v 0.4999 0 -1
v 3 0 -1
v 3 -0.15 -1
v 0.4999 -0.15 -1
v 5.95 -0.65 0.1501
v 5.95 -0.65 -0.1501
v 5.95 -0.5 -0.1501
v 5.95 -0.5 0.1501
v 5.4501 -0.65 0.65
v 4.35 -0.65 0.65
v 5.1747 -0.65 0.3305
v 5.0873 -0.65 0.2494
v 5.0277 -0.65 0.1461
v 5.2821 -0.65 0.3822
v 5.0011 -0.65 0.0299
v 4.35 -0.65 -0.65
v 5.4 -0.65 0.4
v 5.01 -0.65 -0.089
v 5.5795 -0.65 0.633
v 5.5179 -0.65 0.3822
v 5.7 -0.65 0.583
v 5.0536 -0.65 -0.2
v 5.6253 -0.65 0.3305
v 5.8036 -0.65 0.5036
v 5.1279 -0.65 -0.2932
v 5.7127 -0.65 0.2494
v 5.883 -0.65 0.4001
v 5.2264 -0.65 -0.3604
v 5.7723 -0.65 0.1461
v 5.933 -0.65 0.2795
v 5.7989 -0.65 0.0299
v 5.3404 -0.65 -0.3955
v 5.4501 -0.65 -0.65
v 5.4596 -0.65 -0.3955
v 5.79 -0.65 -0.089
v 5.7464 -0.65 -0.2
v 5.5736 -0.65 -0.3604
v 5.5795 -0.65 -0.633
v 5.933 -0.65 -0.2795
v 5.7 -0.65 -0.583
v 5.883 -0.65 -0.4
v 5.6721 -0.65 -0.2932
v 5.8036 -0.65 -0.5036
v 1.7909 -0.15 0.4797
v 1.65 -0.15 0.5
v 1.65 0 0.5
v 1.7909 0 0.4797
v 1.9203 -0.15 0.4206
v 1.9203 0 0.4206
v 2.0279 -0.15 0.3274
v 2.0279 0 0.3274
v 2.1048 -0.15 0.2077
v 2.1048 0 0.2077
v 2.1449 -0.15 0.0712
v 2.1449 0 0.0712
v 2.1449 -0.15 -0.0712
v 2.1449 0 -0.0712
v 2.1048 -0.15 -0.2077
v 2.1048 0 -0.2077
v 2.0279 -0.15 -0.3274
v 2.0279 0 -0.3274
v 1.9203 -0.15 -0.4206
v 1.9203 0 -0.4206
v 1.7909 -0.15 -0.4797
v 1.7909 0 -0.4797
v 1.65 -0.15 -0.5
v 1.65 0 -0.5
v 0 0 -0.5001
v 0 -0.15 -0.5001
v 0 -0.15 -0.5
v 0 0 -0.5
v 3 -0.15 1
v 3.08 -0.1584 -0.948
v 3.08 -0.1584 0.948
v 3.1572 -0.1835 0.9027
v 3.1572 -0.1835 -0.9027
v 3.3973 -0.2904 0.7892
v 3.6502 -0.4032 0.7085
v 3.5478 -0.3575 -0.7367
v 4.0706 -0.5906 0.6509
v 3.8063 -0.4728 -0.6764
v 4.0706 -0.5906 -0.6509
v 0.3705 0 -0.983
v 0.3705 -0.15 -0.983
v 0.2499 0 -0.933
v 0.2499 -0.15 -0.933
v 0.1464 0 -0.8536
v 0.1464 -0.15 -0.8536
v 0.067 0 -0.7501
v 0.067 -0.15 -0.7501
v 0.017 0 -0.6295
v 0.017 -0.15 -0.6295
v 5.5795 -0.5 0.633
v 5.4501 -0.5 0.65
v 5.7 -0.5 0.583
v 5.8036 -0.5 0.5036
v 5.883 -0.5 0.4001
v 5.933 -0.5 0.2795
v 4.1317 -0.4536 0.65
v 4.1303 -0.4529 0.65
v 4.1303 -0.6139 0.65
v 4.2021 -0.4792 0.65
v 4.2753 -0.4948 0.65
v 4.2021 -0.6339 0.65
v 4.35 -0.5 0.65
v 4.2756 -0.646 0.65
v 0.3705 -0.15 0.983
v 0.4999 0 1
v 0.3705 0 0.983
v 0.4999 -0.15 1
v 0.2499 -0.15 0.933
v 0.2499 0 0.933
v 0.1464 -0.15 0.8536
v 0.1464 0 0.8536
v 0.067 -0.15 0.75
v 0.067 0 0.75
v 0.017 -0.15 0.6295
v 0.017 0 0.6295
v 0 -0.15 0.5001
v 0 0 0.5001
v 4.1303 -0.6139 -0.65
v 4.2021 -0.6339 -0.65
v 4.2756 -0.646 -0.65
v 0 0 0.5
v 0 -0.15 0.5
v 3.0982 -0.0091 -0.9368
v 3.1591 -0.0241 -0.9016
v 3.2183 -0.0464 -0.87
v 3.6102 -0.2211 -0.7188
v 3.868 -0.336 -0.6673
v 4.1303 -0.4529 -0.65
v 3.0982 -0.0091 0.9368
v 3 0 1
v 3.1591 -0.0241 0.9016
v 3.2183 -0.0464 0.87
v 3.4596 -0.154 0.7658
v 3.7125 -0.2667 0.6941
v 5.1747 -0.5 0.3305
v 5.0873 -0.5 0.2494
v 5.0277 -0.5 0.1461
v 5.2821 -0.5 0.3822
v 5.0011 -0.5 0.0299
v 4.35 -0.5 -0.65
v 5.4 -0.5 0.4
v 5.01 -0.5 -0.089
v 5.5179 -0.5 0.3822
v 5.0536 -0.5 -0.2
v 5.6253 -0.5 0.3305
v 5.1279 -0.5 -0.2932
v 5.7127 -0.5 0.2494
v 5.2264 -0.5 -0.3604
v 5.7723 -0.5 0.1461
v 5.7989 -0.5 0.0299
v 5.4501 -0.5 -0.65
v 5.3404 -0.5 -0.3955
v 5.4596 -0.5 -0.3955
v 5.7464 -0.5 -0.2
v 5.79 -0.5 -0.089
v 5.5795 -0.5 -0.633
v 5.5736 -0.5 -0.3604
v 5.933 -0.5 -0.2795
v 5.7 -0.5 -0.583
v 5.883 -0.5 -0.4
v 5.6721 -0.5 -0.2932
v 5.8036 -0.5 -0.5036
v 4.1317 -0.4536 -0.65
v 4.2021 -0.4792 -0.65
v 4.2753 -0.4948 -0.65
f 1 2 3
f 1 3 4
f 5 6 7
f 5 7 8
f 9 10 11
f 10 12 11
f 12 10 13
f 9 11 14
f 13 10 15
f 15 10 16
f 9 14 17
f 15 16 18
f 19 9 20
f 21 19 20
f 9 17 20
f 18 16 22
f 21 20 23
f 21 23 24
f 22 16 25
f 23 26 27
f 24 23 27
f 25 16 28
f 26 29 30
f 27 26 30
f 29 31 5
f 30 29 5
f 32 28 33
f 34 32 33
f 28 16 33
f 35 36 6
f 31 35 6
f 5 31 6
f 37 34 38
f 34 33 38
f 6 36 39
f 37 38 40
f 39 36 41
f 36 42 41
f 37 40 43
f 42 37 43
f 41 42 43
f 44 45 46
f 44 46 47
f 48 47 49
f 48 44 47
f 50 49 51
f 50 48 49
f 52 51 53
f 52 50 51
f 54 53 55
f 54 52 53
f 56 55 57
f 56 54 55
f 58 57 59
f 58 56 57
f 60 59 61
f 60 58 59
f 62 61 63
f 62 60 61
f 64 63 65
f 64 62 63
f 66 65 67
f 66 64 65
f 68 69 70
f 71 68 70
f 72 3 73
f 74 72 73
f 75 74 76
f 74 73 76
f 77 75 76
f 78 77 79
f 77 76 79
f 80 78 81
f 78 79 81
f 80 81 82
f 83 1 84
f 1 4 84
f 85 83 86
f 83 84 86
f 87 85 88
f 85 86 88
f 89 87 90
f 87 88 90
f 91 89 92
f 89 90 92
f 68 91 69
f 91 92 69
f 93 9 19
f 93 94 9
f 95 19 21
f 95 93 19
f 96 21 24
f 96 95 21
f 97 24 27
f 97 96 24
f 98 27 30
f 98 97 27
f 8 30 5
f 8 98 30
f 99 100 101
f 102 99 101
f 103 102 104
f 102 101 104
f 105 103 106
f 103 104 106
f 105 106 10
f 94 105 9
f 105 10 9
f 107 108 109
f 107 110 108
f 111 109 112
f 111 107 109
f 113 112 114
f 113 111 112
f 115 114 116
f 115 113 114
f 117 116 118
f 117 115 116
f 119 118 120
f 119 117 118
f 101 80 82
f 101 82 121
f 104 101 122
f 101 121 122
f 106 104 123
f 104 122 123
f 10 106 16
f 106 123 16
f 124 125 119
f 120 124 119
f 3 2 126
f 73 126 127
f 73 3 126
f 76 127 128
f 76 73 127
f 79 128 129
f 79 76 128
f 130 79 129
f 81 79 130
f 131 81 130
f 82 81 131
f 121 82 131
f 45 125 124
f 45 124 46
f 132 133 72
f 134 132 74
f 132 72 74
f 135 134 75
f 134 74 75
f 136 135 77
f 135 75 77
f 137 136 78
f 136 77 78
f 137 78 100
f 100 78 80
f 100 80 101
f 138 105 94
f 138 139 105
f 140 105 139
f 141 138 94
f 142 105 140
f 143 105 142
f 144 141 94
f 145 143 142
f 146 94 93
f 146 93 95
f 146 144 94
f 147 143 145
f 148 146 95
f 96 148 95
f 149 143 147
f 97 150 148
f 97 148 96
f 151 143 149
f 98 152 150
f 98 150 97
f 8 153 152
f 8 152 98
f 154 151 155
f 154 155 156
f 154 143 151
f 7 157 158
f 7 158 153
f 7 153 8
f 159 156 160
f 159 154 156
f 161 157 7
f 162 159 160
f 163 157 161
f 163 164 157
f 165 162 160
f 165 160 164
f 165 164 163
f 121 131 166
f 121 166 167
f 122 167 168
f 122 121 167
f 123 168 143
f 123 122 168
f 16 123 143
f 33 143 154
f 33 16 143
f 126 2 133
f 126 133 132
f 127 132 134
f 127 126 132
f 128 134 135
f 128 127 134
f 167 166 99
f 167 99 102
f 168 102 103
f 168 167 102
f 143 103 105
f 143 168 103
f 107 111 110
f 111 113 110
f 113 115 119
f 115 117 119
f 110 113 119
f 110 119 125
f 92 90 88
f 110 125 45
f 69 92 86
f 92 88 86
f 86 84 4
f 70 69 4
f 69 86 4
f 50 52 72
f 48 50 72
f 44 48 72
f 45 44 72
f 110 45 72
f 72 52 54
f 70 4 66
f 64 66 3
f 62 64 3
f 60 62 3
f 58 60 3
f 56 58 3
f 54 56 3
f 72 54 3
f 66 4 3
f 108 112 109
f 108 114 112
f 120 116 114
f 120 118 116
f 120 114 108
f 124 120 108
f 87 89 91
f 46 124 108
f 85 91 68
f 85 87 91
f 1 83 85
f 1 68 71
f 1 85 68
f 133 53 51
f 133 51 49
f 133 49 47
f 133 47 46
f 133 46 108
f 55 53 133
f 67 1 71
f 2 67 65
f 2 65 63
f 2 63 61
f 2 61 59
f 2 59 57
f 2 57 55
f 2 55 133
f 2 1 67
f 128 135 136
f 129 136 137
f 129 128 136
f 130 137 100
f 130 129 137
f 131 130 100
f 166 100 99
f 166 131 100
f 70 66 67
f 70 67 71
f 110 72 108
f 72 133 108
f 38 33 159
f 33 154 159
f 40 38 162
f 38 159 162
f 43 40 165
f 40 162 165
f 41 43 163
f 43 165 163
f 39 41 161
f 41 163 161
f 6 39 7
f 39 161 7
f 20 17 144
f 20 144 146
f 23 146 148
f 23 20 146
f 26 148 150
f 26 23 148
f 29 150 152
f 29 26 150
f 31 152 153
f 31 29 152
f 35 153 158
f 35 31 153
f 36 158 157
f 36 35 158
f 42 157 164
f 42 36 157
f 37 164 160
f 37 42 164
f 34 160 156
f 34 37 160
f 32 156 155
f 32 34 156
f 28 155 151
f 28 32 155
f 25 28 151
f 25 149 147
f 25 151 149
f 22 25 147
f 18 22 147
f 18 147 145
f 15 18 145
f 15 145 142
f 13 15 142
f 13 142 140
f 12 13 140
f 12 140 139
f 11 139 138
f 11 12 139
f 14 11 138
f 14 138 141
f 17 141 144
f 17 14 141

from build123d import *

# Parameters (mm, degrees)
SURFACE_EXTRUDE1_1_BACK  = 1
SURFACE_EXTRUDE1_1_DEPTH = 2
THICKEN1_T2              = 0.15
CUT_EXTRUDE2_DEPTH       = 7.054130821
CUT_EXTRUDE2_DEPTH_BACK  = 7.054130821
SKETCH3_R                = 0.4
FILLET1_R                = 0.5


with BuildPart() as body_1:
    # Surface-Extrude1: a surface, the sketch's curves swept straight by 2 mm
    with BuildLine(Plane.XY.offset(-SURFACE_EXTRUDE1_1_BACK), mode=Mode.PRIVATE) as surface_extrude1_1_path:
        Line((0, 0), (3, 0))
        ThreePointArc((3, 0), (3.111597724, -0.011740696), (3.218308792, -0.046448679))
        Line((3.218308792, -0.046448679), (4.131691208, -0.453551321))
        ThreePointArc((4.131691208, -0.453551321), (4.238402276, -0.488259304), (4.35, -0.5))
        Line((4.35, -0.5), (5.95, -0.5))
    surface_extrude1_1 = Shell.extrude(surface_extrude1_1_path.wire(), (0 * SURFACE_EXTRUDE1_1_DEPTH, 0 * SURFACE_EXTRUDE1_1_DEPTH, 1 * SURFACE_EXTRUDE1_1_DEPTH))
    add(Solid.thicken(surface_extrude1_1, -THICKEN1_T2))

    # Sketch3 → Cut-Extrude2 (cut, two sides: drawn at the far end of the back side and taken through both)
    with BuildSketch(Plane(origin=(0, -0.5, 0), x_dir=(1, 0, 0), z_dir=(0, 1, 0)).offset(-CUT_EXTRUDE2_DEPTH_BACK)):
        with Locations(Location((5.4, 0, 0), (0, 0, 270))):
            Circle(SKETCH3_R)
        with BuildLine():
            Line((1.65, 0.5), (0, 0.5))
            Line((0, 0.5), (0, -0.5))
            Line((0, -0.5), (1.65, -0.5))
            ThreePointArc((1.65, -0.5), (2.15, 0), (1.65, 0.5))
        make_face()
        with BuildLine():
            Line((4.130265456, 0.65), (5.95, 0.65))
            Line((5.95, 0.65), (5.95, 1))
            Line((5.95, 1), (3, 1))
            ThreePointArc((3, 1), (3.538657477, 0.739502683), (4.130265456, 0.65))
        make_face()
        with BuildLine():
            Line((4.130265456, -0.65), (5.95, -0.65))
            Line((5.95, -0.65), (5.95, -1))
            Line((5.95, -1), (3, -1))
            ThreePointArc((3, -1), (3.538657477, -0.739502683), (4.130265456, -0.65))
        make_face()
    extrude(amount=CUT_EXTRUDE2_DEPTH + CUT_EXTRUDE2_DEPTH_BACK, mode=Mode.SUBTRACT)

    # Fillet1
    fillet1_edges = [body_1.edges().sort_by_distance(p)[0] for p in [
        (0, -0.075, 1),
        (0, -0.075, -1),
        (5.95, -0.575, -0.65),
        (5.95, -0.575, 0.65),
    ]]
    fillet(fillet1_edges, radius=FILLET1_R - 0.0001)  # a hair under: the kernel refuses the full size


solid = body_1.part
